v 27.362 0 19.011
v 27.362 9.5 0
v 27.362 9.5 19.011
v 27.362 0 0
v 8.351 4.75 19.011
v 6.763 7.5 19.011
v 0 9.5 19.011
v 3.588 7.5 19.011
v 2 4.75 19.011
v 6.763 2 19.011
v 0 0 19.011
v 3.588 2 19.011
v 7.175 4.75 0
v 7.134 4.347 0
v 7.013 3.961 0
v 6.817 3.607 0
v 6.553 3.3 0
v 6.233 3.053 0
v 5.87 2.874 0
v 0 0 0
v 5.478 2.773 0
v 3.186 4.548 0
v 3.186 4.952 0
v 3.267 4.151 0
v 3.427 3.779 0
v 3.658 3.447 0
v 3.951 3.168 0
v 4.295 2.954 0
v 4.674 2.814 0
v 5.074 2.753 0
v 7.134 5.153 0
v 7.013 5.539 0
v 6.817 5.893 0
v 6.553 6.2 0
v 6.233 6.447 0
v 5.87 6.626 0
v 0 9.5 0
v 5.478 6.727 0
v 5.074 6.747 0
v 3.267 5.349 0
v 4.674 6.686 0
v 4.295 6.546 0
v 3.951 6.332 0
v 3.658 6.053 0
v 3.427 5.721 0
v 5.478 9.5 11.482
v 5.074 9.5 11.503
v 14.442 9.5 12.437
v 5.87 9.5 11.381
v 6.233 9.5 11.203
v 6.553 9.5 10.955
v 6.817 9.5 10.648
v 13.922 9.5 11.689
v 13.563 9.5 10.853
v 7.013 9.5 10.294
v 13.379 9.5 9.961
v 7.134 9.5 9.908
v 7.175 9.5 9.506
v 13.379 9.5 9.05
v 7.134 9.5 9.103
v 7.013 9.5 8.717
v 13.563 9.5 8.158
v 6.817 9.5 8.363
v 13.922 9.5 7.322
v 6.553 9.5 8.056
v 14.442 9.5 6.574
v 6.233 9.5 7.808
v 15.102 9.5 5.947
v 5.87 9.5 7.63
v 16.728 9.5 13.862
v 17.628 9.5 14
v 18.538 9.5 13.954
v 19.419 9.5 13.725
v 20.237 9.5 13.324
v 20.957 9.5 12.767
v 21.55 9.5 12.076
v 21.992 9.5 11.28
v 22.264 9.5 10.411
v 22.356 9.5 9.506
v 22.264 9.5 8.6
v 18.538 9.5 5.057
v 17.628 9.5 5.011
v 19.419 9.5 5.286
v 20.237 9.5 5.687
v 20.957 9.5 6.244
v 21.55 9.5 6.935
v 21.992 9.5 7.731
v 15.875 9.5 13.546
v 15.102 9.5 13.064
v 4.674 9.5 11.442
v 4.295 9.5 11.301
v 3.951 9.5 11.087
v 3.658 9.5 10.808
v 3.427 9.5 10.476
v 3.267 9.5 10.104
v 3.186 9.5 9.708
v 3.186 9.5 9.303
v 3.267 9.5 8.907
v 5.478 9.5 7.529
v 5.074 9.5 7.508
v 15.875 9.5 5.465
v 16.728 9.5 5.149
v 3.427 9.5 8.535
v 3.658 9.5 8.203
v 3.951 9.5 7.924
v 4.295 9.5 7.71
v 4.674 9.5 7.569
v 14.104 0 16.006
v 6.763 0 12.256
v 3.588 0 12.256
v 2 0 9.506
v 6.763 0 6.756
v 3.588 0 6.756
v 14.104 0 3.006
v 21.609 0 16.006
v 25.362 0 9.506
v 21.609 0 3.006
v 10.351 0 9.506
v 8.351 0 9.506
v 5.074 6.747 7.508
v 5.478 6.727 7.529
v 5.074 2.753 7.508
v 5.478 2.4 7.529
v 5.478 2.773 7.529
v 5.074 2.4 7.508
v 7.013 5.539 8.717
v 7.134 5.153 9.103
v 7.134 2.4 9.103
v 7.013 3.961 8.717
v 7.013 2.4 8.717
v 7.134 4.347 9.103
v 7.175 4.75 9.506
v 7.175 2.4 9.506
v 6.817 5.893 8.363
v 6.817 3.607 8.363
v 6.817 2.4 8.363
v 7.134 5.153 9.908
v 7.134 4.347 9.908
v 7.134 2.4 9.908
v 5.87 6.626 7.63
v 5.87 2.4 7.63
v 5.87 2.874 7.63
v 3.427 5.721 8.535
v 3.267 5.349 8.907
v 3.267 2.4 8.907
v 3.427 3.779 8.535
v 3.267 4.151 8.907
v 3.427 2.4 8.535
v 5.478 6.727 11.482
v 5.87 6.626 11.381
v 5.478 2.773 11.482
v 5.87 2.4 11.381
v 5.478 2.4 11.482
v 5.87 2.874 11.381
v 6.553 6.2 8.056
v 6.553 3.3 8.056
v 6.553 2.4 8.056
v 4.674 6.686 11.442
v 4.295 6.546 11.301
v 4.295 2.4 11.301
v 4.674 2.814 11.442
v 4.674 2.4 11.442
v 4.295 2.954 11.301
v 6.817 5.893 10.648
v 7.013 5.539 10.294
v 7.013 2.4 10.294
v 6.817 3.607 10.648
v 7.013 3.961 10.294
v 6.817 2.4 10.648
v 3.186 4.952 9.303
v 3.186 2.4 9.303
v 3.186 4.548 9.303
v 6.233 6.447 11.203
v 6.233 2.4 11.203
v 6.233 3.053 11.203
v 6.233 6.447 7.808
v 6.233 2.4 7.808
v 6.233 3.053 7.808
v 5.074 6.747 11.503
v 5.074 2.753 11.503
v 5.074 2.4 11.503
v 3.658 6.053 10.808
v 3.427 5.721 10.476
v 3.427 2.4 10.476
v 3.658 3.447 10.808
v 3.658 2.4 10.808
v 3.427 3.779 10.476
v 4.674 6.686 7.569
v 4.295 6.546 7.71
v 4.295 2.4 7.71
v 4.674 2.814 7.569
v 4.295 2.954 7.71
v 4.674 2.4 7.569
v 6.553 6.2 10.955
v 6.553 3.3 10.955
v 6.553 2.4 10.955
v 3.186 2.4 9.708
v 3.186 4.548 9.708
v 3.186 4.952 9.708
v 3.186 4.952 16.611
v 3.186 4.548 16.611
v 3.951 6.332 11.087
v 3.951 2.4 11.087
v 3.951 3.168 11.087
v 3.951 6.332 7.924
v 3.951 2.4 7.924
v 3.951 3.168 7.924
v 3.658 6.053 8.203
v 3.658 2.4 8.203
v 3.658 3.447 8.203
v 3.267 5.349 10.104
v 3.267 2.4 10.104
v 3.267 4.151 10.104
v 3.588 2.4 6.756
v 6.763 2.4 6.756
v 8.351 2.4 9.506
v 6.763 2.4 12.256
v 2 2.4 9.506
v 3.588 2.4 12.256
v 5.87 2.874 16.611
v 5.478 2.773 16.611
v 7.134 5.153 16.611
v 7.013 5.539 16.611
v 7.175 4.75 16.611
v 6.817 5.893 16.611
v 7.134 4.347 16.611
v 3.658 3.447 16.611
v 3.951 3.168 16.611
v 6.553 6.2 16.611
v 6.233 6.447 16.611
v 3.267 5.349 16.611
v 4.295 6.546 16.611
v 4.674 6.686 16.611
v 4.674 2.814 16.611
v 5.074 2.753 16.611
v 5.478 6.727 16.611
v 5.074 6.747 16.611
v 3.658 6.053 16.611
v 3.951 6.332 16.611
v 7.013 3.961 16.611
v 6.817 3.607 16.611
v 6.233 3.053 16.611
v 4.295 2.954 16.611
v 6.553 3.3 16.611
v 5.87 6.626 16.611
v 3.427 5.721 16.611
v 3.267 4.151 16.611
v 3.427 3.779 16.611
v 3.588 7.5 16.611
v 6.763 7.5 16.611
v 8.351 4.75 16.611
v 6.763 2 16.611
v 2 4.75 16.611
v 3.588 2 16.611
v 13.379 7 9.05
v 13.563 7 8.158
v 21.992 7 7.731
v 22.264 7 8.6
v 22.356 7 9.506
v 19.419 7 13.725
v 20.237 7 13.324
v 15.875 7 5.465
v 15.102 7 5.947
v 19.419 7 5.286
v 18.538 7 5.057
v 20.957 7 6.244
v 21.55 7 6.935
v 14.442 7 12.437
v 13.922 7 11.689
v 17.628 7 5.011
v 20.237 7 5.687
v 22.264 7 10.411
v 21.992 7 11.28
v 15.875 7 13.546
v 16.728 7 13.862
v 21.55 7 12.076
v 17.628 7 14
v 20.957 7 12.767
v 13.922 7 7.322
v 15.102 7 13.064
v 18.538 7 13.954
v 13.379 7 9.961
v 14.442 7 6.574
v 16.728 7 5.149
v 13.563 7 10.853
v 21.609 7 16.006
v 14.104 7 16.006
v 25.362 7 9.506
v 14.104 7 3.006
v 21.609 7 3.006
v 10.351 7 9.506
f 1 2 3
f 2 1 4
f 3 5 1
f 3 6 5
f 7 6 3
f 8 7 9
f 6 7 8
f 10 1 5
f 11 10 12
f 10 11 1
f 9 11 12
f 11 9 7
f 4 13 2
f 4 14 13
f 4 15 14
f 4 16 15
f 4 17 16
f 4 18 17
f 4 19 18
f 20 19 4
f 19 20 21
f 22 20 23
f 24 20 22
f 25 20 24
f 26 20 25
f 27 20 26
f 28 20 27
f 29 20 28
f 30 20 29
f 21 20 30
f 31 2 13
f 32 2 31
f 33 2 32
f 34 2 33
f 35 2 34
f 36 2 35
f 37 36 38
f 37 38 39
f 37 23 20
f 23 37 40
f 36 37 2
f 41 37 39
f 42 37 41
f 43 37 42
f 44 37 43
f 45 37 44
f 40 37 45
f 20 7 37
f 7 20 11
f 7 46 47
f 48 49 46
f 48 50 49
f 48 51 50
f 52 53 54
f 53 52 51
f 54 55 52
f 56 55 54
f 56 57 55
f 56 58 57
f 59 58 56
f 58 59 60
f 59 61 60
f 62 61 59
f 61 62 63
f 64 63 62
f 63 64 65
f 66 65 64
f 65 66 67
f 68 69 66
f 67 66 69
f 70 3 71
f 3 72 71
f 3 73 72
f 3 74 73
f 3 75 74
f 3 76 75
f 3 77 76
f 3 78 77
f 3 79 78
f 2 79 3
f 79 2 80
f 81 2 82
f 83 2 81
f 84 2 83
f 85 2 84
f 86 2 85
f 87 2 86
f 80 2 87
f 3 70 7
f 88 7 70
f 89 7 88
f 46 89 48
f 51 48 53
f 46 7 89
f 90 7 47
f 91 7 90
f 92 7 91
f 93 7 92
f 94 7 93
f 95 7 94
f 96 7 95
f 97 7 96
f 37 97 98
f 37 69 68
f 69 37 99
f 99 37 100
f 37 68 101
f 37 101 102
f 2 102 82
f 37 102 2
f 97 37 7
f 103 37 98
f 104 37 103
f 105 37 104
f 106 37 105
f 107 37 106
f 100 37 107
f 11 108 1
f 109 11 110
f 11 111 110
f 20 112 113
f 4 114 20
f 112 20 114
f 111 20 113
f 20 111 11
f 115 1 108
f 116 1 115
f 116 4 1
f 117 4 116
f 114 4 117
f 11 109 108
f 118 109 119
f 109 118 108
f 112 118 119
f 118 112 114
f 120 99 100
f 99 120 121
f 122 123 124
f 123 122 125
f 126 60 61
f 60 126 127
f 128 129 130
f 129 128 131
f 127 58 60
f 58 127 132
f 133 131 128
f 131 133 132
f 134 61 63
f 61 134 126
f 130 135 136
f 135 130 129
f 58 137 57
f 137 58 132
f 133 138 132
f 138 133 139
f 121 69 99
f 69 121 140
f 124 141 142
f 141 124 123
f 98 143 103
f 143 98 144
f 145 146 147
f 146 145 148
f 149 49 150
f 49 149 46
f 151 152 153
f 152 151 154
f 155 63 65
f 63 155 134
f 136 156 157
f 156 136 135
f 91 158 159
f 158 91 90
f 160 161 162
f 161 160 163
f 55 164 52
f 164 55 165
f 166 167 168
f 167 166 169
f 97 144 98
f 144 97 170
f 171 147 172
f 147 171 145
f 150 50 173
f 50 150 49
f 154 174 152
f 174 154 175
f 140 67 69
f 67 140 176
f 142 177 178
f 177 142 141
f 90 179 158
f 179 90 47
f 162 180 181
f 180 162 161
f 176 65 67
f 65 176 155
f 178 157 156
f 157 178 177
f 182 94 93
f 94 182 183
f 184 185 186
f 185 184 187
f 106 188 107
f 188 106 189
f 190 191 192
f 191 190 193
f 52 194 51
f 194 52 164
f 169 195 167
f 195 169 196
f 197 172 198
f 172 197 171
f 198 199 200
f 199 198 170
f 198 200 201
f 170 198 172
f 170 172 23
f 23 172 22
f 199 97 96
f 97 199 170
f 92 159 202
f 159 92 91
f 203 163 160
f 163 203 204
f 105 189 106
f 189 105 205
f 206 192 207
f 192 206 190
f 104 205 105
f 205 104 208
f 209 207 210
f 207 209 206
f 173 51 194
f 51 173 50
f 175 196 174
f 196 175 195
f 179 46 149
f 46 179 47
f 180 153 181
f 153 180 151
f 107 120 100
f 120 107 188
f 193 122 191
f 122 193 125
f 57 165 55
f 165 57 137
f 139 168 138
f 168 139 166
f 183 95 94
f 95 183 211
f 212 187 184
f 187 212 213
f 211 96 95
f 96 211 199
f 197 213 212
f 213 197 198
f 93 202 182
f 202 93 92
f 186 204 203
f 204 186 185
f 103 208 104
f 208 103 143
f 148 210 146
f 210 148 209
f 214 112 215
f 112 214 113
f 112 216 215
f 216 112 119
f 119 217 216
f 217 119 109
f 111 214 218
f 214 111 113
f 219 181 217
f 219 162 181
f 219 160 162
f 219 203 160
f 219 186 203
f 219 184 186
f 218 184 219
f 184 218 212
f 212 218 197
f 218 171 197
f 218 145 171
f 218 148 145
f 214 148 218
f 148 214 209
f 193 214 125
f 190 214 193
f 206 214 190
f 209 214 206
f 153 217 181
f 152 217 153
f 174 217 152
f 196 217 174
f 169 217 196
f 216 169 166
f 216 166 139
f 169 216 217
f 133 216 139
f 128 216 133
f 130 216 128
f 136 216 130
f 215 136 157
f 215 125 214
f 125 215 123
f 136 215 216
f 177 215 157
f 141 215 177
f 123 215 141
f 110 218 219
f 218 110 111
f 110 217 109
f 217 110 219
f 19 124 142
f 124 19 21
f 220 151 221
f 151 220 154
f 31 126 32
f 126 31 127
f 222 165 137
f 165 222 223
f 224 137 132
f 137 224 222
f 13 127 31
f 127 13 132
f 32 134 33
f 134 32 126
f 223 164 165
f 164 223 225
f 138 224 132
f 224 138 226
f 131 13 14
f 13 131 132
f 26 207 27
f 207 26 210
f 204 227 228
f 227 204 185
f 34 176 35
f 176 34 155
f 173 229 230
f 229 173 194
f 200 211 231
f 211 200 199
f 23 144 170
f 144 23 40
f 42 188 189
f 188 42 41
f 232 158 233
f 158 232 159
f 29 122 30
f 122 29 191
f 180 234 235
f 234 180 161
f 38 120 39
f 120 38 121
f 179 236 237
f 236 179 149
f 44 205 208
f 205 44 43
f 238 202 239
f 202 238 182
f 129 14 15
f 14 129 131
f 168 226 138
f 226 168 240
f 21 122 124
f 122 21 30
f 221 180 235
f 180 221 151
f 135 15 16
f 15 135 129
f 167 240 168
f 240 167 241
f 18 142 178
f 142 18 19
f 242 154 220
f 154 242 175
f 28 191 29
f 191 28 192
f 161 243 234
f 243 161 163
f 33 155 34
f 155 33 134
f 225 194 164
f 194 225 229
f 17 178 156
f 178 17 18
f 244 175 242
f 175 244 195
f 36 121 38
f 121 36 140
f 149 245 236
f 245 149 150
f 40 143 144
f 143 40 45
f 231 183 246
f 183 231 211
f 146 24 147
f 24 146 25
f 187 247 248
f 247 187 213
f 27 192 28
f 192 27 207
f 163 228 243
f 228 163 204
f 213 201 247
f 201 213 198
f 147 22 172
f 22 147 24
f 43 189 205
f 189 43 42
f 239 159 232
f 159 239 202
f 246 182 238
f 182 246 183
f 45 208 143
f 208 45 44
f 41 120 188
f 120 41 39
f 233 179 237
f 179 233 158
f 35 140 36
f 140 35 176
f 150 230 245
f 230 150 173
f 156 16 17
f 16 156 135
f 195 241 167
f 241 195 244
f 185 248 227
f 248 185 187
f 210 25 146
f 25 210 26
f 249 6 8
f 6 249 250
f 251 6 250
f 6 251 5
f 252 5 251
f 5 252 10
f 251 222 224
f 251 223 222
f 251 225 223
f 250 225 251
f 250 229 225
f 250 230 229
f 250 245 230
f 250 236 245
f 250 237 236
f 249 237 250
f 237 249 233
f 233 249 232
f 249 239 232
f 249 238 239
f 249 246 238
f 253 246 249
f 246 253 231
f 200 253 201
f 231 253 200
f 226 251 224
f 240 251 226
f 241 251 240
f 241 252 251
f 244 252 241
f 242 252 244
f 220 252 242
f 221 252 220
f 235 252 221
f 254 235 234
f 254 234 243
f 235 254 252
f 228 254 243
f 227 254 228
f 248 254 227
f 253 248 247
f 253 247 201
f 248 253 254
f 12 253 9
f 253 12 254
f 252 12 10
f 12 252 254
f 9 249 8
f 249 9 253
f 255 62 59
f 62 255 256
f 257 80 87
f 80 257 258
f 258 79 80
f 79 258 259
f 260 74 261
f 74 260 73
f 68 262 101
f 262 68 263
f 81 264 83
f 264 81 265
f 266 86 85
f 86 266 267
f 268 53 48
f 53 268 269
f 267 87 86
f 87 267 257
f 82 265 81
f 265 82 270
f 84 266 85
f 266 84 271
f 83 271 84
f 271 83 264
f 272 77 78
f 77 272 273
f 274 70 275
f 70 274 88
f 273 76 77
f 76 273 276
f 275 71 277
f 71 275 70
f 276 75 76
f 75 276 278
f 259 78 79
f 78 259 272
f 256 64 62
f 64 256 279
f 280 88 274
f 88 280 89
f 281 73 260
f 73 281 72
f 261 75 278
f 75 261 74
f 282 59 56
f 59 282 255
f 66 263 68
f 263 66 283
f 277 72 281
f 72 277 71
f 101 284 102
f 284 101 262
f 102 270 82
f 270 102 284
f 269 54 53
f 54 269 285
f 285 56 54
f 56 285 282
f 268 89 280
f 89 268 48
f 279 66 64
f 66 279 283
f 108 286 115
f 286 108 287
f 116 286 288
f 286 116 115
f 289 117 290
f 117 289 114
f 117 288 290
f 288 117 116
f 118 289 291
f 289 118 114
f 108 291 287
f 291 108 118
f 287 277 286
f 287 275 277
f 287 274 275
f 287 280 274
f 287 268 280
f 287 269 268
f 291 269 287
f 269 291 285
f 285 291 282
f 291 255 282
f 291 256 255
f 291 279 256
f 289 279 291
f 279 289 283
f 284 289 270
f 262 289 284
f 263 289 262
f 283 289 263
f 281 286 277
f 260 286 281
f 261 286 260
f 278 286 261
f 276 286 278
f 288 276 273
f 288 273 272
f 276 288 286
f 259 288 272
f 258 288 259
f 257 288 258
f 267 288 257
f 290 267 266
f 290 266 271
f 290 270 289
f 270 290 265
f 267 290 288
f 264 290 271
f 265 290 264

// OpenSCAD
// file: config.scad
// This is the config for an M8 Mendel sized printer.

//Constants (These are used throughout the whole printer)
frameroddia = 9; //the frame rod diameter
smoothroddia = 8; //the smooth rod diameter
bushingod = 15; //The prusabushing OD, you can change this to 15 to use LM8UU linear bearings 
bushingheight = 24;

nemasize = 1.7; //Nema Size
motorcenter = 23; //center hole size for the motor. If your motor center flange is smaller you can beef up parts this way. 
motorshaftdia = 5; // Motor shaft diameter
motorbody = 43;

pulleypitch = 5; //trapezoidal pulley script TODO
pulleyteeth = 8;

/* The Mixtape Mendel uses two types of fasteners. One is the "primary" type, which is the larger type that builds the structure,
 which was profiled above as "frameroddia, etc..". In the case of the Mendel, it is M8 threaded rod (Huxley, M6). It also uses "Secondary" hardware. This is a smaller screw which normally corerelates with the motor crew used.
*/
nutheight = 7; //Primary
nutapothem = 13; //Primary

secscrewdia = 4; //secondary 
secnutapothem = 5.5; //sec
secnutheight = 2.4; //sec

beltthick = 2; //Thickness of the timing belt
beltwidth = 6; // Belt width used for the y bed clamps

mdfthick = 6; //thickness of MDF (You can use other wood, acrylic, lexan, etc)

bearingid = 8; // 608
bearingod = 22; // 608
bearinginnerrace = 12; // the amount of the inner race diameter exposed

layerheight = 0.32; //skeinforge/slicer layer height, used for the idler wasers right now. 

pinchwheeldia = 8;

//Groove Mount
	//Default is pretty good for MakerGear insulators
groovedia = 12;
grooveheight = 4.5;
// main file
/*
  Mixtape Mendel - A Fully Parametric RepRap
    Copyright (C) 2011  Steve Kelly

    This program is free software: you can redistribute it and/or modify
    it under the terms of the GNU General Public License as published by
    the Free Software Foundation, either version 3 of the License, or
    (at your option) any later version.

    This program is distributed in the hope that it will be useful,
    but WITHOUT ANY WARRANTY; without even the implied warranty of
    MERCHANTABILITY or FITNESS FOR A PARTICULAR PURPOSE.  See the
    GNU General Public License for more details.

    You should have received a copy of the GNU General Public License
    along with this program.  If not, see <http://www.gnu.org/licenses/>.
*/

include <config.scad>;
$fn = 31;

	difference(){

		union(){

			cube([(secnutapothem+nutapothem)/cos(30)+6, secnutapothem+4 , nutapothem/cos(30)+4]);   

		}
		//horizontal secondary	
		translate([(secnutapothem/2)/cos(30)+2,-1,(nutapothem/cos(30)+4)/2])rotate([-90,0,0])cylinder(r = secscrewdia/2, h = secnutapothem+6);
		translate([(secnutapothem/2)/cos(30)+2,-1,(nutapothem/cos(30)+4)/2])rotate([-90,0,0])cylinder(r = (secnutapothem/cos(30))/2, h = secnutheight+1, $fn=6);

		//verticle secondary
		translate([(secnutapothem/2)/cos(30)+2,(secnutapothem+4 )/2,-1])rotate([0,0,0])cylinder(r = secscrewdia/2, h =  nutapothem/cos(30)+6);
		translate([(secnutapothem/2)/cos(30)+2,(secnutapothem+4 )/2,nutapothem/cos(30)+4-secnutheight])cylinder(r = (secnutapothem/cos(30))/2, h = secnutheight+1, $fn=6);

		//horizontal primary	
		translate([(secnutapothem)/cos(30)+4+(nutapothem/cos(30))/2,-1,(nutapothem/cos(30)+4)/2])rotate([-90,0,0])cylinder(r = frameroddia/2, h = secnutapothem+6);
		translate([(secnutapothem)/cos(30)+4+(nutapothem/cos(30))/2,-1,(nutapothem/cos(30)+4)/2])rotate([-90,0,0])cylinder(r = (nutapothem/cos(30))/2, h = nutheight+1, $fn=6);

	}
